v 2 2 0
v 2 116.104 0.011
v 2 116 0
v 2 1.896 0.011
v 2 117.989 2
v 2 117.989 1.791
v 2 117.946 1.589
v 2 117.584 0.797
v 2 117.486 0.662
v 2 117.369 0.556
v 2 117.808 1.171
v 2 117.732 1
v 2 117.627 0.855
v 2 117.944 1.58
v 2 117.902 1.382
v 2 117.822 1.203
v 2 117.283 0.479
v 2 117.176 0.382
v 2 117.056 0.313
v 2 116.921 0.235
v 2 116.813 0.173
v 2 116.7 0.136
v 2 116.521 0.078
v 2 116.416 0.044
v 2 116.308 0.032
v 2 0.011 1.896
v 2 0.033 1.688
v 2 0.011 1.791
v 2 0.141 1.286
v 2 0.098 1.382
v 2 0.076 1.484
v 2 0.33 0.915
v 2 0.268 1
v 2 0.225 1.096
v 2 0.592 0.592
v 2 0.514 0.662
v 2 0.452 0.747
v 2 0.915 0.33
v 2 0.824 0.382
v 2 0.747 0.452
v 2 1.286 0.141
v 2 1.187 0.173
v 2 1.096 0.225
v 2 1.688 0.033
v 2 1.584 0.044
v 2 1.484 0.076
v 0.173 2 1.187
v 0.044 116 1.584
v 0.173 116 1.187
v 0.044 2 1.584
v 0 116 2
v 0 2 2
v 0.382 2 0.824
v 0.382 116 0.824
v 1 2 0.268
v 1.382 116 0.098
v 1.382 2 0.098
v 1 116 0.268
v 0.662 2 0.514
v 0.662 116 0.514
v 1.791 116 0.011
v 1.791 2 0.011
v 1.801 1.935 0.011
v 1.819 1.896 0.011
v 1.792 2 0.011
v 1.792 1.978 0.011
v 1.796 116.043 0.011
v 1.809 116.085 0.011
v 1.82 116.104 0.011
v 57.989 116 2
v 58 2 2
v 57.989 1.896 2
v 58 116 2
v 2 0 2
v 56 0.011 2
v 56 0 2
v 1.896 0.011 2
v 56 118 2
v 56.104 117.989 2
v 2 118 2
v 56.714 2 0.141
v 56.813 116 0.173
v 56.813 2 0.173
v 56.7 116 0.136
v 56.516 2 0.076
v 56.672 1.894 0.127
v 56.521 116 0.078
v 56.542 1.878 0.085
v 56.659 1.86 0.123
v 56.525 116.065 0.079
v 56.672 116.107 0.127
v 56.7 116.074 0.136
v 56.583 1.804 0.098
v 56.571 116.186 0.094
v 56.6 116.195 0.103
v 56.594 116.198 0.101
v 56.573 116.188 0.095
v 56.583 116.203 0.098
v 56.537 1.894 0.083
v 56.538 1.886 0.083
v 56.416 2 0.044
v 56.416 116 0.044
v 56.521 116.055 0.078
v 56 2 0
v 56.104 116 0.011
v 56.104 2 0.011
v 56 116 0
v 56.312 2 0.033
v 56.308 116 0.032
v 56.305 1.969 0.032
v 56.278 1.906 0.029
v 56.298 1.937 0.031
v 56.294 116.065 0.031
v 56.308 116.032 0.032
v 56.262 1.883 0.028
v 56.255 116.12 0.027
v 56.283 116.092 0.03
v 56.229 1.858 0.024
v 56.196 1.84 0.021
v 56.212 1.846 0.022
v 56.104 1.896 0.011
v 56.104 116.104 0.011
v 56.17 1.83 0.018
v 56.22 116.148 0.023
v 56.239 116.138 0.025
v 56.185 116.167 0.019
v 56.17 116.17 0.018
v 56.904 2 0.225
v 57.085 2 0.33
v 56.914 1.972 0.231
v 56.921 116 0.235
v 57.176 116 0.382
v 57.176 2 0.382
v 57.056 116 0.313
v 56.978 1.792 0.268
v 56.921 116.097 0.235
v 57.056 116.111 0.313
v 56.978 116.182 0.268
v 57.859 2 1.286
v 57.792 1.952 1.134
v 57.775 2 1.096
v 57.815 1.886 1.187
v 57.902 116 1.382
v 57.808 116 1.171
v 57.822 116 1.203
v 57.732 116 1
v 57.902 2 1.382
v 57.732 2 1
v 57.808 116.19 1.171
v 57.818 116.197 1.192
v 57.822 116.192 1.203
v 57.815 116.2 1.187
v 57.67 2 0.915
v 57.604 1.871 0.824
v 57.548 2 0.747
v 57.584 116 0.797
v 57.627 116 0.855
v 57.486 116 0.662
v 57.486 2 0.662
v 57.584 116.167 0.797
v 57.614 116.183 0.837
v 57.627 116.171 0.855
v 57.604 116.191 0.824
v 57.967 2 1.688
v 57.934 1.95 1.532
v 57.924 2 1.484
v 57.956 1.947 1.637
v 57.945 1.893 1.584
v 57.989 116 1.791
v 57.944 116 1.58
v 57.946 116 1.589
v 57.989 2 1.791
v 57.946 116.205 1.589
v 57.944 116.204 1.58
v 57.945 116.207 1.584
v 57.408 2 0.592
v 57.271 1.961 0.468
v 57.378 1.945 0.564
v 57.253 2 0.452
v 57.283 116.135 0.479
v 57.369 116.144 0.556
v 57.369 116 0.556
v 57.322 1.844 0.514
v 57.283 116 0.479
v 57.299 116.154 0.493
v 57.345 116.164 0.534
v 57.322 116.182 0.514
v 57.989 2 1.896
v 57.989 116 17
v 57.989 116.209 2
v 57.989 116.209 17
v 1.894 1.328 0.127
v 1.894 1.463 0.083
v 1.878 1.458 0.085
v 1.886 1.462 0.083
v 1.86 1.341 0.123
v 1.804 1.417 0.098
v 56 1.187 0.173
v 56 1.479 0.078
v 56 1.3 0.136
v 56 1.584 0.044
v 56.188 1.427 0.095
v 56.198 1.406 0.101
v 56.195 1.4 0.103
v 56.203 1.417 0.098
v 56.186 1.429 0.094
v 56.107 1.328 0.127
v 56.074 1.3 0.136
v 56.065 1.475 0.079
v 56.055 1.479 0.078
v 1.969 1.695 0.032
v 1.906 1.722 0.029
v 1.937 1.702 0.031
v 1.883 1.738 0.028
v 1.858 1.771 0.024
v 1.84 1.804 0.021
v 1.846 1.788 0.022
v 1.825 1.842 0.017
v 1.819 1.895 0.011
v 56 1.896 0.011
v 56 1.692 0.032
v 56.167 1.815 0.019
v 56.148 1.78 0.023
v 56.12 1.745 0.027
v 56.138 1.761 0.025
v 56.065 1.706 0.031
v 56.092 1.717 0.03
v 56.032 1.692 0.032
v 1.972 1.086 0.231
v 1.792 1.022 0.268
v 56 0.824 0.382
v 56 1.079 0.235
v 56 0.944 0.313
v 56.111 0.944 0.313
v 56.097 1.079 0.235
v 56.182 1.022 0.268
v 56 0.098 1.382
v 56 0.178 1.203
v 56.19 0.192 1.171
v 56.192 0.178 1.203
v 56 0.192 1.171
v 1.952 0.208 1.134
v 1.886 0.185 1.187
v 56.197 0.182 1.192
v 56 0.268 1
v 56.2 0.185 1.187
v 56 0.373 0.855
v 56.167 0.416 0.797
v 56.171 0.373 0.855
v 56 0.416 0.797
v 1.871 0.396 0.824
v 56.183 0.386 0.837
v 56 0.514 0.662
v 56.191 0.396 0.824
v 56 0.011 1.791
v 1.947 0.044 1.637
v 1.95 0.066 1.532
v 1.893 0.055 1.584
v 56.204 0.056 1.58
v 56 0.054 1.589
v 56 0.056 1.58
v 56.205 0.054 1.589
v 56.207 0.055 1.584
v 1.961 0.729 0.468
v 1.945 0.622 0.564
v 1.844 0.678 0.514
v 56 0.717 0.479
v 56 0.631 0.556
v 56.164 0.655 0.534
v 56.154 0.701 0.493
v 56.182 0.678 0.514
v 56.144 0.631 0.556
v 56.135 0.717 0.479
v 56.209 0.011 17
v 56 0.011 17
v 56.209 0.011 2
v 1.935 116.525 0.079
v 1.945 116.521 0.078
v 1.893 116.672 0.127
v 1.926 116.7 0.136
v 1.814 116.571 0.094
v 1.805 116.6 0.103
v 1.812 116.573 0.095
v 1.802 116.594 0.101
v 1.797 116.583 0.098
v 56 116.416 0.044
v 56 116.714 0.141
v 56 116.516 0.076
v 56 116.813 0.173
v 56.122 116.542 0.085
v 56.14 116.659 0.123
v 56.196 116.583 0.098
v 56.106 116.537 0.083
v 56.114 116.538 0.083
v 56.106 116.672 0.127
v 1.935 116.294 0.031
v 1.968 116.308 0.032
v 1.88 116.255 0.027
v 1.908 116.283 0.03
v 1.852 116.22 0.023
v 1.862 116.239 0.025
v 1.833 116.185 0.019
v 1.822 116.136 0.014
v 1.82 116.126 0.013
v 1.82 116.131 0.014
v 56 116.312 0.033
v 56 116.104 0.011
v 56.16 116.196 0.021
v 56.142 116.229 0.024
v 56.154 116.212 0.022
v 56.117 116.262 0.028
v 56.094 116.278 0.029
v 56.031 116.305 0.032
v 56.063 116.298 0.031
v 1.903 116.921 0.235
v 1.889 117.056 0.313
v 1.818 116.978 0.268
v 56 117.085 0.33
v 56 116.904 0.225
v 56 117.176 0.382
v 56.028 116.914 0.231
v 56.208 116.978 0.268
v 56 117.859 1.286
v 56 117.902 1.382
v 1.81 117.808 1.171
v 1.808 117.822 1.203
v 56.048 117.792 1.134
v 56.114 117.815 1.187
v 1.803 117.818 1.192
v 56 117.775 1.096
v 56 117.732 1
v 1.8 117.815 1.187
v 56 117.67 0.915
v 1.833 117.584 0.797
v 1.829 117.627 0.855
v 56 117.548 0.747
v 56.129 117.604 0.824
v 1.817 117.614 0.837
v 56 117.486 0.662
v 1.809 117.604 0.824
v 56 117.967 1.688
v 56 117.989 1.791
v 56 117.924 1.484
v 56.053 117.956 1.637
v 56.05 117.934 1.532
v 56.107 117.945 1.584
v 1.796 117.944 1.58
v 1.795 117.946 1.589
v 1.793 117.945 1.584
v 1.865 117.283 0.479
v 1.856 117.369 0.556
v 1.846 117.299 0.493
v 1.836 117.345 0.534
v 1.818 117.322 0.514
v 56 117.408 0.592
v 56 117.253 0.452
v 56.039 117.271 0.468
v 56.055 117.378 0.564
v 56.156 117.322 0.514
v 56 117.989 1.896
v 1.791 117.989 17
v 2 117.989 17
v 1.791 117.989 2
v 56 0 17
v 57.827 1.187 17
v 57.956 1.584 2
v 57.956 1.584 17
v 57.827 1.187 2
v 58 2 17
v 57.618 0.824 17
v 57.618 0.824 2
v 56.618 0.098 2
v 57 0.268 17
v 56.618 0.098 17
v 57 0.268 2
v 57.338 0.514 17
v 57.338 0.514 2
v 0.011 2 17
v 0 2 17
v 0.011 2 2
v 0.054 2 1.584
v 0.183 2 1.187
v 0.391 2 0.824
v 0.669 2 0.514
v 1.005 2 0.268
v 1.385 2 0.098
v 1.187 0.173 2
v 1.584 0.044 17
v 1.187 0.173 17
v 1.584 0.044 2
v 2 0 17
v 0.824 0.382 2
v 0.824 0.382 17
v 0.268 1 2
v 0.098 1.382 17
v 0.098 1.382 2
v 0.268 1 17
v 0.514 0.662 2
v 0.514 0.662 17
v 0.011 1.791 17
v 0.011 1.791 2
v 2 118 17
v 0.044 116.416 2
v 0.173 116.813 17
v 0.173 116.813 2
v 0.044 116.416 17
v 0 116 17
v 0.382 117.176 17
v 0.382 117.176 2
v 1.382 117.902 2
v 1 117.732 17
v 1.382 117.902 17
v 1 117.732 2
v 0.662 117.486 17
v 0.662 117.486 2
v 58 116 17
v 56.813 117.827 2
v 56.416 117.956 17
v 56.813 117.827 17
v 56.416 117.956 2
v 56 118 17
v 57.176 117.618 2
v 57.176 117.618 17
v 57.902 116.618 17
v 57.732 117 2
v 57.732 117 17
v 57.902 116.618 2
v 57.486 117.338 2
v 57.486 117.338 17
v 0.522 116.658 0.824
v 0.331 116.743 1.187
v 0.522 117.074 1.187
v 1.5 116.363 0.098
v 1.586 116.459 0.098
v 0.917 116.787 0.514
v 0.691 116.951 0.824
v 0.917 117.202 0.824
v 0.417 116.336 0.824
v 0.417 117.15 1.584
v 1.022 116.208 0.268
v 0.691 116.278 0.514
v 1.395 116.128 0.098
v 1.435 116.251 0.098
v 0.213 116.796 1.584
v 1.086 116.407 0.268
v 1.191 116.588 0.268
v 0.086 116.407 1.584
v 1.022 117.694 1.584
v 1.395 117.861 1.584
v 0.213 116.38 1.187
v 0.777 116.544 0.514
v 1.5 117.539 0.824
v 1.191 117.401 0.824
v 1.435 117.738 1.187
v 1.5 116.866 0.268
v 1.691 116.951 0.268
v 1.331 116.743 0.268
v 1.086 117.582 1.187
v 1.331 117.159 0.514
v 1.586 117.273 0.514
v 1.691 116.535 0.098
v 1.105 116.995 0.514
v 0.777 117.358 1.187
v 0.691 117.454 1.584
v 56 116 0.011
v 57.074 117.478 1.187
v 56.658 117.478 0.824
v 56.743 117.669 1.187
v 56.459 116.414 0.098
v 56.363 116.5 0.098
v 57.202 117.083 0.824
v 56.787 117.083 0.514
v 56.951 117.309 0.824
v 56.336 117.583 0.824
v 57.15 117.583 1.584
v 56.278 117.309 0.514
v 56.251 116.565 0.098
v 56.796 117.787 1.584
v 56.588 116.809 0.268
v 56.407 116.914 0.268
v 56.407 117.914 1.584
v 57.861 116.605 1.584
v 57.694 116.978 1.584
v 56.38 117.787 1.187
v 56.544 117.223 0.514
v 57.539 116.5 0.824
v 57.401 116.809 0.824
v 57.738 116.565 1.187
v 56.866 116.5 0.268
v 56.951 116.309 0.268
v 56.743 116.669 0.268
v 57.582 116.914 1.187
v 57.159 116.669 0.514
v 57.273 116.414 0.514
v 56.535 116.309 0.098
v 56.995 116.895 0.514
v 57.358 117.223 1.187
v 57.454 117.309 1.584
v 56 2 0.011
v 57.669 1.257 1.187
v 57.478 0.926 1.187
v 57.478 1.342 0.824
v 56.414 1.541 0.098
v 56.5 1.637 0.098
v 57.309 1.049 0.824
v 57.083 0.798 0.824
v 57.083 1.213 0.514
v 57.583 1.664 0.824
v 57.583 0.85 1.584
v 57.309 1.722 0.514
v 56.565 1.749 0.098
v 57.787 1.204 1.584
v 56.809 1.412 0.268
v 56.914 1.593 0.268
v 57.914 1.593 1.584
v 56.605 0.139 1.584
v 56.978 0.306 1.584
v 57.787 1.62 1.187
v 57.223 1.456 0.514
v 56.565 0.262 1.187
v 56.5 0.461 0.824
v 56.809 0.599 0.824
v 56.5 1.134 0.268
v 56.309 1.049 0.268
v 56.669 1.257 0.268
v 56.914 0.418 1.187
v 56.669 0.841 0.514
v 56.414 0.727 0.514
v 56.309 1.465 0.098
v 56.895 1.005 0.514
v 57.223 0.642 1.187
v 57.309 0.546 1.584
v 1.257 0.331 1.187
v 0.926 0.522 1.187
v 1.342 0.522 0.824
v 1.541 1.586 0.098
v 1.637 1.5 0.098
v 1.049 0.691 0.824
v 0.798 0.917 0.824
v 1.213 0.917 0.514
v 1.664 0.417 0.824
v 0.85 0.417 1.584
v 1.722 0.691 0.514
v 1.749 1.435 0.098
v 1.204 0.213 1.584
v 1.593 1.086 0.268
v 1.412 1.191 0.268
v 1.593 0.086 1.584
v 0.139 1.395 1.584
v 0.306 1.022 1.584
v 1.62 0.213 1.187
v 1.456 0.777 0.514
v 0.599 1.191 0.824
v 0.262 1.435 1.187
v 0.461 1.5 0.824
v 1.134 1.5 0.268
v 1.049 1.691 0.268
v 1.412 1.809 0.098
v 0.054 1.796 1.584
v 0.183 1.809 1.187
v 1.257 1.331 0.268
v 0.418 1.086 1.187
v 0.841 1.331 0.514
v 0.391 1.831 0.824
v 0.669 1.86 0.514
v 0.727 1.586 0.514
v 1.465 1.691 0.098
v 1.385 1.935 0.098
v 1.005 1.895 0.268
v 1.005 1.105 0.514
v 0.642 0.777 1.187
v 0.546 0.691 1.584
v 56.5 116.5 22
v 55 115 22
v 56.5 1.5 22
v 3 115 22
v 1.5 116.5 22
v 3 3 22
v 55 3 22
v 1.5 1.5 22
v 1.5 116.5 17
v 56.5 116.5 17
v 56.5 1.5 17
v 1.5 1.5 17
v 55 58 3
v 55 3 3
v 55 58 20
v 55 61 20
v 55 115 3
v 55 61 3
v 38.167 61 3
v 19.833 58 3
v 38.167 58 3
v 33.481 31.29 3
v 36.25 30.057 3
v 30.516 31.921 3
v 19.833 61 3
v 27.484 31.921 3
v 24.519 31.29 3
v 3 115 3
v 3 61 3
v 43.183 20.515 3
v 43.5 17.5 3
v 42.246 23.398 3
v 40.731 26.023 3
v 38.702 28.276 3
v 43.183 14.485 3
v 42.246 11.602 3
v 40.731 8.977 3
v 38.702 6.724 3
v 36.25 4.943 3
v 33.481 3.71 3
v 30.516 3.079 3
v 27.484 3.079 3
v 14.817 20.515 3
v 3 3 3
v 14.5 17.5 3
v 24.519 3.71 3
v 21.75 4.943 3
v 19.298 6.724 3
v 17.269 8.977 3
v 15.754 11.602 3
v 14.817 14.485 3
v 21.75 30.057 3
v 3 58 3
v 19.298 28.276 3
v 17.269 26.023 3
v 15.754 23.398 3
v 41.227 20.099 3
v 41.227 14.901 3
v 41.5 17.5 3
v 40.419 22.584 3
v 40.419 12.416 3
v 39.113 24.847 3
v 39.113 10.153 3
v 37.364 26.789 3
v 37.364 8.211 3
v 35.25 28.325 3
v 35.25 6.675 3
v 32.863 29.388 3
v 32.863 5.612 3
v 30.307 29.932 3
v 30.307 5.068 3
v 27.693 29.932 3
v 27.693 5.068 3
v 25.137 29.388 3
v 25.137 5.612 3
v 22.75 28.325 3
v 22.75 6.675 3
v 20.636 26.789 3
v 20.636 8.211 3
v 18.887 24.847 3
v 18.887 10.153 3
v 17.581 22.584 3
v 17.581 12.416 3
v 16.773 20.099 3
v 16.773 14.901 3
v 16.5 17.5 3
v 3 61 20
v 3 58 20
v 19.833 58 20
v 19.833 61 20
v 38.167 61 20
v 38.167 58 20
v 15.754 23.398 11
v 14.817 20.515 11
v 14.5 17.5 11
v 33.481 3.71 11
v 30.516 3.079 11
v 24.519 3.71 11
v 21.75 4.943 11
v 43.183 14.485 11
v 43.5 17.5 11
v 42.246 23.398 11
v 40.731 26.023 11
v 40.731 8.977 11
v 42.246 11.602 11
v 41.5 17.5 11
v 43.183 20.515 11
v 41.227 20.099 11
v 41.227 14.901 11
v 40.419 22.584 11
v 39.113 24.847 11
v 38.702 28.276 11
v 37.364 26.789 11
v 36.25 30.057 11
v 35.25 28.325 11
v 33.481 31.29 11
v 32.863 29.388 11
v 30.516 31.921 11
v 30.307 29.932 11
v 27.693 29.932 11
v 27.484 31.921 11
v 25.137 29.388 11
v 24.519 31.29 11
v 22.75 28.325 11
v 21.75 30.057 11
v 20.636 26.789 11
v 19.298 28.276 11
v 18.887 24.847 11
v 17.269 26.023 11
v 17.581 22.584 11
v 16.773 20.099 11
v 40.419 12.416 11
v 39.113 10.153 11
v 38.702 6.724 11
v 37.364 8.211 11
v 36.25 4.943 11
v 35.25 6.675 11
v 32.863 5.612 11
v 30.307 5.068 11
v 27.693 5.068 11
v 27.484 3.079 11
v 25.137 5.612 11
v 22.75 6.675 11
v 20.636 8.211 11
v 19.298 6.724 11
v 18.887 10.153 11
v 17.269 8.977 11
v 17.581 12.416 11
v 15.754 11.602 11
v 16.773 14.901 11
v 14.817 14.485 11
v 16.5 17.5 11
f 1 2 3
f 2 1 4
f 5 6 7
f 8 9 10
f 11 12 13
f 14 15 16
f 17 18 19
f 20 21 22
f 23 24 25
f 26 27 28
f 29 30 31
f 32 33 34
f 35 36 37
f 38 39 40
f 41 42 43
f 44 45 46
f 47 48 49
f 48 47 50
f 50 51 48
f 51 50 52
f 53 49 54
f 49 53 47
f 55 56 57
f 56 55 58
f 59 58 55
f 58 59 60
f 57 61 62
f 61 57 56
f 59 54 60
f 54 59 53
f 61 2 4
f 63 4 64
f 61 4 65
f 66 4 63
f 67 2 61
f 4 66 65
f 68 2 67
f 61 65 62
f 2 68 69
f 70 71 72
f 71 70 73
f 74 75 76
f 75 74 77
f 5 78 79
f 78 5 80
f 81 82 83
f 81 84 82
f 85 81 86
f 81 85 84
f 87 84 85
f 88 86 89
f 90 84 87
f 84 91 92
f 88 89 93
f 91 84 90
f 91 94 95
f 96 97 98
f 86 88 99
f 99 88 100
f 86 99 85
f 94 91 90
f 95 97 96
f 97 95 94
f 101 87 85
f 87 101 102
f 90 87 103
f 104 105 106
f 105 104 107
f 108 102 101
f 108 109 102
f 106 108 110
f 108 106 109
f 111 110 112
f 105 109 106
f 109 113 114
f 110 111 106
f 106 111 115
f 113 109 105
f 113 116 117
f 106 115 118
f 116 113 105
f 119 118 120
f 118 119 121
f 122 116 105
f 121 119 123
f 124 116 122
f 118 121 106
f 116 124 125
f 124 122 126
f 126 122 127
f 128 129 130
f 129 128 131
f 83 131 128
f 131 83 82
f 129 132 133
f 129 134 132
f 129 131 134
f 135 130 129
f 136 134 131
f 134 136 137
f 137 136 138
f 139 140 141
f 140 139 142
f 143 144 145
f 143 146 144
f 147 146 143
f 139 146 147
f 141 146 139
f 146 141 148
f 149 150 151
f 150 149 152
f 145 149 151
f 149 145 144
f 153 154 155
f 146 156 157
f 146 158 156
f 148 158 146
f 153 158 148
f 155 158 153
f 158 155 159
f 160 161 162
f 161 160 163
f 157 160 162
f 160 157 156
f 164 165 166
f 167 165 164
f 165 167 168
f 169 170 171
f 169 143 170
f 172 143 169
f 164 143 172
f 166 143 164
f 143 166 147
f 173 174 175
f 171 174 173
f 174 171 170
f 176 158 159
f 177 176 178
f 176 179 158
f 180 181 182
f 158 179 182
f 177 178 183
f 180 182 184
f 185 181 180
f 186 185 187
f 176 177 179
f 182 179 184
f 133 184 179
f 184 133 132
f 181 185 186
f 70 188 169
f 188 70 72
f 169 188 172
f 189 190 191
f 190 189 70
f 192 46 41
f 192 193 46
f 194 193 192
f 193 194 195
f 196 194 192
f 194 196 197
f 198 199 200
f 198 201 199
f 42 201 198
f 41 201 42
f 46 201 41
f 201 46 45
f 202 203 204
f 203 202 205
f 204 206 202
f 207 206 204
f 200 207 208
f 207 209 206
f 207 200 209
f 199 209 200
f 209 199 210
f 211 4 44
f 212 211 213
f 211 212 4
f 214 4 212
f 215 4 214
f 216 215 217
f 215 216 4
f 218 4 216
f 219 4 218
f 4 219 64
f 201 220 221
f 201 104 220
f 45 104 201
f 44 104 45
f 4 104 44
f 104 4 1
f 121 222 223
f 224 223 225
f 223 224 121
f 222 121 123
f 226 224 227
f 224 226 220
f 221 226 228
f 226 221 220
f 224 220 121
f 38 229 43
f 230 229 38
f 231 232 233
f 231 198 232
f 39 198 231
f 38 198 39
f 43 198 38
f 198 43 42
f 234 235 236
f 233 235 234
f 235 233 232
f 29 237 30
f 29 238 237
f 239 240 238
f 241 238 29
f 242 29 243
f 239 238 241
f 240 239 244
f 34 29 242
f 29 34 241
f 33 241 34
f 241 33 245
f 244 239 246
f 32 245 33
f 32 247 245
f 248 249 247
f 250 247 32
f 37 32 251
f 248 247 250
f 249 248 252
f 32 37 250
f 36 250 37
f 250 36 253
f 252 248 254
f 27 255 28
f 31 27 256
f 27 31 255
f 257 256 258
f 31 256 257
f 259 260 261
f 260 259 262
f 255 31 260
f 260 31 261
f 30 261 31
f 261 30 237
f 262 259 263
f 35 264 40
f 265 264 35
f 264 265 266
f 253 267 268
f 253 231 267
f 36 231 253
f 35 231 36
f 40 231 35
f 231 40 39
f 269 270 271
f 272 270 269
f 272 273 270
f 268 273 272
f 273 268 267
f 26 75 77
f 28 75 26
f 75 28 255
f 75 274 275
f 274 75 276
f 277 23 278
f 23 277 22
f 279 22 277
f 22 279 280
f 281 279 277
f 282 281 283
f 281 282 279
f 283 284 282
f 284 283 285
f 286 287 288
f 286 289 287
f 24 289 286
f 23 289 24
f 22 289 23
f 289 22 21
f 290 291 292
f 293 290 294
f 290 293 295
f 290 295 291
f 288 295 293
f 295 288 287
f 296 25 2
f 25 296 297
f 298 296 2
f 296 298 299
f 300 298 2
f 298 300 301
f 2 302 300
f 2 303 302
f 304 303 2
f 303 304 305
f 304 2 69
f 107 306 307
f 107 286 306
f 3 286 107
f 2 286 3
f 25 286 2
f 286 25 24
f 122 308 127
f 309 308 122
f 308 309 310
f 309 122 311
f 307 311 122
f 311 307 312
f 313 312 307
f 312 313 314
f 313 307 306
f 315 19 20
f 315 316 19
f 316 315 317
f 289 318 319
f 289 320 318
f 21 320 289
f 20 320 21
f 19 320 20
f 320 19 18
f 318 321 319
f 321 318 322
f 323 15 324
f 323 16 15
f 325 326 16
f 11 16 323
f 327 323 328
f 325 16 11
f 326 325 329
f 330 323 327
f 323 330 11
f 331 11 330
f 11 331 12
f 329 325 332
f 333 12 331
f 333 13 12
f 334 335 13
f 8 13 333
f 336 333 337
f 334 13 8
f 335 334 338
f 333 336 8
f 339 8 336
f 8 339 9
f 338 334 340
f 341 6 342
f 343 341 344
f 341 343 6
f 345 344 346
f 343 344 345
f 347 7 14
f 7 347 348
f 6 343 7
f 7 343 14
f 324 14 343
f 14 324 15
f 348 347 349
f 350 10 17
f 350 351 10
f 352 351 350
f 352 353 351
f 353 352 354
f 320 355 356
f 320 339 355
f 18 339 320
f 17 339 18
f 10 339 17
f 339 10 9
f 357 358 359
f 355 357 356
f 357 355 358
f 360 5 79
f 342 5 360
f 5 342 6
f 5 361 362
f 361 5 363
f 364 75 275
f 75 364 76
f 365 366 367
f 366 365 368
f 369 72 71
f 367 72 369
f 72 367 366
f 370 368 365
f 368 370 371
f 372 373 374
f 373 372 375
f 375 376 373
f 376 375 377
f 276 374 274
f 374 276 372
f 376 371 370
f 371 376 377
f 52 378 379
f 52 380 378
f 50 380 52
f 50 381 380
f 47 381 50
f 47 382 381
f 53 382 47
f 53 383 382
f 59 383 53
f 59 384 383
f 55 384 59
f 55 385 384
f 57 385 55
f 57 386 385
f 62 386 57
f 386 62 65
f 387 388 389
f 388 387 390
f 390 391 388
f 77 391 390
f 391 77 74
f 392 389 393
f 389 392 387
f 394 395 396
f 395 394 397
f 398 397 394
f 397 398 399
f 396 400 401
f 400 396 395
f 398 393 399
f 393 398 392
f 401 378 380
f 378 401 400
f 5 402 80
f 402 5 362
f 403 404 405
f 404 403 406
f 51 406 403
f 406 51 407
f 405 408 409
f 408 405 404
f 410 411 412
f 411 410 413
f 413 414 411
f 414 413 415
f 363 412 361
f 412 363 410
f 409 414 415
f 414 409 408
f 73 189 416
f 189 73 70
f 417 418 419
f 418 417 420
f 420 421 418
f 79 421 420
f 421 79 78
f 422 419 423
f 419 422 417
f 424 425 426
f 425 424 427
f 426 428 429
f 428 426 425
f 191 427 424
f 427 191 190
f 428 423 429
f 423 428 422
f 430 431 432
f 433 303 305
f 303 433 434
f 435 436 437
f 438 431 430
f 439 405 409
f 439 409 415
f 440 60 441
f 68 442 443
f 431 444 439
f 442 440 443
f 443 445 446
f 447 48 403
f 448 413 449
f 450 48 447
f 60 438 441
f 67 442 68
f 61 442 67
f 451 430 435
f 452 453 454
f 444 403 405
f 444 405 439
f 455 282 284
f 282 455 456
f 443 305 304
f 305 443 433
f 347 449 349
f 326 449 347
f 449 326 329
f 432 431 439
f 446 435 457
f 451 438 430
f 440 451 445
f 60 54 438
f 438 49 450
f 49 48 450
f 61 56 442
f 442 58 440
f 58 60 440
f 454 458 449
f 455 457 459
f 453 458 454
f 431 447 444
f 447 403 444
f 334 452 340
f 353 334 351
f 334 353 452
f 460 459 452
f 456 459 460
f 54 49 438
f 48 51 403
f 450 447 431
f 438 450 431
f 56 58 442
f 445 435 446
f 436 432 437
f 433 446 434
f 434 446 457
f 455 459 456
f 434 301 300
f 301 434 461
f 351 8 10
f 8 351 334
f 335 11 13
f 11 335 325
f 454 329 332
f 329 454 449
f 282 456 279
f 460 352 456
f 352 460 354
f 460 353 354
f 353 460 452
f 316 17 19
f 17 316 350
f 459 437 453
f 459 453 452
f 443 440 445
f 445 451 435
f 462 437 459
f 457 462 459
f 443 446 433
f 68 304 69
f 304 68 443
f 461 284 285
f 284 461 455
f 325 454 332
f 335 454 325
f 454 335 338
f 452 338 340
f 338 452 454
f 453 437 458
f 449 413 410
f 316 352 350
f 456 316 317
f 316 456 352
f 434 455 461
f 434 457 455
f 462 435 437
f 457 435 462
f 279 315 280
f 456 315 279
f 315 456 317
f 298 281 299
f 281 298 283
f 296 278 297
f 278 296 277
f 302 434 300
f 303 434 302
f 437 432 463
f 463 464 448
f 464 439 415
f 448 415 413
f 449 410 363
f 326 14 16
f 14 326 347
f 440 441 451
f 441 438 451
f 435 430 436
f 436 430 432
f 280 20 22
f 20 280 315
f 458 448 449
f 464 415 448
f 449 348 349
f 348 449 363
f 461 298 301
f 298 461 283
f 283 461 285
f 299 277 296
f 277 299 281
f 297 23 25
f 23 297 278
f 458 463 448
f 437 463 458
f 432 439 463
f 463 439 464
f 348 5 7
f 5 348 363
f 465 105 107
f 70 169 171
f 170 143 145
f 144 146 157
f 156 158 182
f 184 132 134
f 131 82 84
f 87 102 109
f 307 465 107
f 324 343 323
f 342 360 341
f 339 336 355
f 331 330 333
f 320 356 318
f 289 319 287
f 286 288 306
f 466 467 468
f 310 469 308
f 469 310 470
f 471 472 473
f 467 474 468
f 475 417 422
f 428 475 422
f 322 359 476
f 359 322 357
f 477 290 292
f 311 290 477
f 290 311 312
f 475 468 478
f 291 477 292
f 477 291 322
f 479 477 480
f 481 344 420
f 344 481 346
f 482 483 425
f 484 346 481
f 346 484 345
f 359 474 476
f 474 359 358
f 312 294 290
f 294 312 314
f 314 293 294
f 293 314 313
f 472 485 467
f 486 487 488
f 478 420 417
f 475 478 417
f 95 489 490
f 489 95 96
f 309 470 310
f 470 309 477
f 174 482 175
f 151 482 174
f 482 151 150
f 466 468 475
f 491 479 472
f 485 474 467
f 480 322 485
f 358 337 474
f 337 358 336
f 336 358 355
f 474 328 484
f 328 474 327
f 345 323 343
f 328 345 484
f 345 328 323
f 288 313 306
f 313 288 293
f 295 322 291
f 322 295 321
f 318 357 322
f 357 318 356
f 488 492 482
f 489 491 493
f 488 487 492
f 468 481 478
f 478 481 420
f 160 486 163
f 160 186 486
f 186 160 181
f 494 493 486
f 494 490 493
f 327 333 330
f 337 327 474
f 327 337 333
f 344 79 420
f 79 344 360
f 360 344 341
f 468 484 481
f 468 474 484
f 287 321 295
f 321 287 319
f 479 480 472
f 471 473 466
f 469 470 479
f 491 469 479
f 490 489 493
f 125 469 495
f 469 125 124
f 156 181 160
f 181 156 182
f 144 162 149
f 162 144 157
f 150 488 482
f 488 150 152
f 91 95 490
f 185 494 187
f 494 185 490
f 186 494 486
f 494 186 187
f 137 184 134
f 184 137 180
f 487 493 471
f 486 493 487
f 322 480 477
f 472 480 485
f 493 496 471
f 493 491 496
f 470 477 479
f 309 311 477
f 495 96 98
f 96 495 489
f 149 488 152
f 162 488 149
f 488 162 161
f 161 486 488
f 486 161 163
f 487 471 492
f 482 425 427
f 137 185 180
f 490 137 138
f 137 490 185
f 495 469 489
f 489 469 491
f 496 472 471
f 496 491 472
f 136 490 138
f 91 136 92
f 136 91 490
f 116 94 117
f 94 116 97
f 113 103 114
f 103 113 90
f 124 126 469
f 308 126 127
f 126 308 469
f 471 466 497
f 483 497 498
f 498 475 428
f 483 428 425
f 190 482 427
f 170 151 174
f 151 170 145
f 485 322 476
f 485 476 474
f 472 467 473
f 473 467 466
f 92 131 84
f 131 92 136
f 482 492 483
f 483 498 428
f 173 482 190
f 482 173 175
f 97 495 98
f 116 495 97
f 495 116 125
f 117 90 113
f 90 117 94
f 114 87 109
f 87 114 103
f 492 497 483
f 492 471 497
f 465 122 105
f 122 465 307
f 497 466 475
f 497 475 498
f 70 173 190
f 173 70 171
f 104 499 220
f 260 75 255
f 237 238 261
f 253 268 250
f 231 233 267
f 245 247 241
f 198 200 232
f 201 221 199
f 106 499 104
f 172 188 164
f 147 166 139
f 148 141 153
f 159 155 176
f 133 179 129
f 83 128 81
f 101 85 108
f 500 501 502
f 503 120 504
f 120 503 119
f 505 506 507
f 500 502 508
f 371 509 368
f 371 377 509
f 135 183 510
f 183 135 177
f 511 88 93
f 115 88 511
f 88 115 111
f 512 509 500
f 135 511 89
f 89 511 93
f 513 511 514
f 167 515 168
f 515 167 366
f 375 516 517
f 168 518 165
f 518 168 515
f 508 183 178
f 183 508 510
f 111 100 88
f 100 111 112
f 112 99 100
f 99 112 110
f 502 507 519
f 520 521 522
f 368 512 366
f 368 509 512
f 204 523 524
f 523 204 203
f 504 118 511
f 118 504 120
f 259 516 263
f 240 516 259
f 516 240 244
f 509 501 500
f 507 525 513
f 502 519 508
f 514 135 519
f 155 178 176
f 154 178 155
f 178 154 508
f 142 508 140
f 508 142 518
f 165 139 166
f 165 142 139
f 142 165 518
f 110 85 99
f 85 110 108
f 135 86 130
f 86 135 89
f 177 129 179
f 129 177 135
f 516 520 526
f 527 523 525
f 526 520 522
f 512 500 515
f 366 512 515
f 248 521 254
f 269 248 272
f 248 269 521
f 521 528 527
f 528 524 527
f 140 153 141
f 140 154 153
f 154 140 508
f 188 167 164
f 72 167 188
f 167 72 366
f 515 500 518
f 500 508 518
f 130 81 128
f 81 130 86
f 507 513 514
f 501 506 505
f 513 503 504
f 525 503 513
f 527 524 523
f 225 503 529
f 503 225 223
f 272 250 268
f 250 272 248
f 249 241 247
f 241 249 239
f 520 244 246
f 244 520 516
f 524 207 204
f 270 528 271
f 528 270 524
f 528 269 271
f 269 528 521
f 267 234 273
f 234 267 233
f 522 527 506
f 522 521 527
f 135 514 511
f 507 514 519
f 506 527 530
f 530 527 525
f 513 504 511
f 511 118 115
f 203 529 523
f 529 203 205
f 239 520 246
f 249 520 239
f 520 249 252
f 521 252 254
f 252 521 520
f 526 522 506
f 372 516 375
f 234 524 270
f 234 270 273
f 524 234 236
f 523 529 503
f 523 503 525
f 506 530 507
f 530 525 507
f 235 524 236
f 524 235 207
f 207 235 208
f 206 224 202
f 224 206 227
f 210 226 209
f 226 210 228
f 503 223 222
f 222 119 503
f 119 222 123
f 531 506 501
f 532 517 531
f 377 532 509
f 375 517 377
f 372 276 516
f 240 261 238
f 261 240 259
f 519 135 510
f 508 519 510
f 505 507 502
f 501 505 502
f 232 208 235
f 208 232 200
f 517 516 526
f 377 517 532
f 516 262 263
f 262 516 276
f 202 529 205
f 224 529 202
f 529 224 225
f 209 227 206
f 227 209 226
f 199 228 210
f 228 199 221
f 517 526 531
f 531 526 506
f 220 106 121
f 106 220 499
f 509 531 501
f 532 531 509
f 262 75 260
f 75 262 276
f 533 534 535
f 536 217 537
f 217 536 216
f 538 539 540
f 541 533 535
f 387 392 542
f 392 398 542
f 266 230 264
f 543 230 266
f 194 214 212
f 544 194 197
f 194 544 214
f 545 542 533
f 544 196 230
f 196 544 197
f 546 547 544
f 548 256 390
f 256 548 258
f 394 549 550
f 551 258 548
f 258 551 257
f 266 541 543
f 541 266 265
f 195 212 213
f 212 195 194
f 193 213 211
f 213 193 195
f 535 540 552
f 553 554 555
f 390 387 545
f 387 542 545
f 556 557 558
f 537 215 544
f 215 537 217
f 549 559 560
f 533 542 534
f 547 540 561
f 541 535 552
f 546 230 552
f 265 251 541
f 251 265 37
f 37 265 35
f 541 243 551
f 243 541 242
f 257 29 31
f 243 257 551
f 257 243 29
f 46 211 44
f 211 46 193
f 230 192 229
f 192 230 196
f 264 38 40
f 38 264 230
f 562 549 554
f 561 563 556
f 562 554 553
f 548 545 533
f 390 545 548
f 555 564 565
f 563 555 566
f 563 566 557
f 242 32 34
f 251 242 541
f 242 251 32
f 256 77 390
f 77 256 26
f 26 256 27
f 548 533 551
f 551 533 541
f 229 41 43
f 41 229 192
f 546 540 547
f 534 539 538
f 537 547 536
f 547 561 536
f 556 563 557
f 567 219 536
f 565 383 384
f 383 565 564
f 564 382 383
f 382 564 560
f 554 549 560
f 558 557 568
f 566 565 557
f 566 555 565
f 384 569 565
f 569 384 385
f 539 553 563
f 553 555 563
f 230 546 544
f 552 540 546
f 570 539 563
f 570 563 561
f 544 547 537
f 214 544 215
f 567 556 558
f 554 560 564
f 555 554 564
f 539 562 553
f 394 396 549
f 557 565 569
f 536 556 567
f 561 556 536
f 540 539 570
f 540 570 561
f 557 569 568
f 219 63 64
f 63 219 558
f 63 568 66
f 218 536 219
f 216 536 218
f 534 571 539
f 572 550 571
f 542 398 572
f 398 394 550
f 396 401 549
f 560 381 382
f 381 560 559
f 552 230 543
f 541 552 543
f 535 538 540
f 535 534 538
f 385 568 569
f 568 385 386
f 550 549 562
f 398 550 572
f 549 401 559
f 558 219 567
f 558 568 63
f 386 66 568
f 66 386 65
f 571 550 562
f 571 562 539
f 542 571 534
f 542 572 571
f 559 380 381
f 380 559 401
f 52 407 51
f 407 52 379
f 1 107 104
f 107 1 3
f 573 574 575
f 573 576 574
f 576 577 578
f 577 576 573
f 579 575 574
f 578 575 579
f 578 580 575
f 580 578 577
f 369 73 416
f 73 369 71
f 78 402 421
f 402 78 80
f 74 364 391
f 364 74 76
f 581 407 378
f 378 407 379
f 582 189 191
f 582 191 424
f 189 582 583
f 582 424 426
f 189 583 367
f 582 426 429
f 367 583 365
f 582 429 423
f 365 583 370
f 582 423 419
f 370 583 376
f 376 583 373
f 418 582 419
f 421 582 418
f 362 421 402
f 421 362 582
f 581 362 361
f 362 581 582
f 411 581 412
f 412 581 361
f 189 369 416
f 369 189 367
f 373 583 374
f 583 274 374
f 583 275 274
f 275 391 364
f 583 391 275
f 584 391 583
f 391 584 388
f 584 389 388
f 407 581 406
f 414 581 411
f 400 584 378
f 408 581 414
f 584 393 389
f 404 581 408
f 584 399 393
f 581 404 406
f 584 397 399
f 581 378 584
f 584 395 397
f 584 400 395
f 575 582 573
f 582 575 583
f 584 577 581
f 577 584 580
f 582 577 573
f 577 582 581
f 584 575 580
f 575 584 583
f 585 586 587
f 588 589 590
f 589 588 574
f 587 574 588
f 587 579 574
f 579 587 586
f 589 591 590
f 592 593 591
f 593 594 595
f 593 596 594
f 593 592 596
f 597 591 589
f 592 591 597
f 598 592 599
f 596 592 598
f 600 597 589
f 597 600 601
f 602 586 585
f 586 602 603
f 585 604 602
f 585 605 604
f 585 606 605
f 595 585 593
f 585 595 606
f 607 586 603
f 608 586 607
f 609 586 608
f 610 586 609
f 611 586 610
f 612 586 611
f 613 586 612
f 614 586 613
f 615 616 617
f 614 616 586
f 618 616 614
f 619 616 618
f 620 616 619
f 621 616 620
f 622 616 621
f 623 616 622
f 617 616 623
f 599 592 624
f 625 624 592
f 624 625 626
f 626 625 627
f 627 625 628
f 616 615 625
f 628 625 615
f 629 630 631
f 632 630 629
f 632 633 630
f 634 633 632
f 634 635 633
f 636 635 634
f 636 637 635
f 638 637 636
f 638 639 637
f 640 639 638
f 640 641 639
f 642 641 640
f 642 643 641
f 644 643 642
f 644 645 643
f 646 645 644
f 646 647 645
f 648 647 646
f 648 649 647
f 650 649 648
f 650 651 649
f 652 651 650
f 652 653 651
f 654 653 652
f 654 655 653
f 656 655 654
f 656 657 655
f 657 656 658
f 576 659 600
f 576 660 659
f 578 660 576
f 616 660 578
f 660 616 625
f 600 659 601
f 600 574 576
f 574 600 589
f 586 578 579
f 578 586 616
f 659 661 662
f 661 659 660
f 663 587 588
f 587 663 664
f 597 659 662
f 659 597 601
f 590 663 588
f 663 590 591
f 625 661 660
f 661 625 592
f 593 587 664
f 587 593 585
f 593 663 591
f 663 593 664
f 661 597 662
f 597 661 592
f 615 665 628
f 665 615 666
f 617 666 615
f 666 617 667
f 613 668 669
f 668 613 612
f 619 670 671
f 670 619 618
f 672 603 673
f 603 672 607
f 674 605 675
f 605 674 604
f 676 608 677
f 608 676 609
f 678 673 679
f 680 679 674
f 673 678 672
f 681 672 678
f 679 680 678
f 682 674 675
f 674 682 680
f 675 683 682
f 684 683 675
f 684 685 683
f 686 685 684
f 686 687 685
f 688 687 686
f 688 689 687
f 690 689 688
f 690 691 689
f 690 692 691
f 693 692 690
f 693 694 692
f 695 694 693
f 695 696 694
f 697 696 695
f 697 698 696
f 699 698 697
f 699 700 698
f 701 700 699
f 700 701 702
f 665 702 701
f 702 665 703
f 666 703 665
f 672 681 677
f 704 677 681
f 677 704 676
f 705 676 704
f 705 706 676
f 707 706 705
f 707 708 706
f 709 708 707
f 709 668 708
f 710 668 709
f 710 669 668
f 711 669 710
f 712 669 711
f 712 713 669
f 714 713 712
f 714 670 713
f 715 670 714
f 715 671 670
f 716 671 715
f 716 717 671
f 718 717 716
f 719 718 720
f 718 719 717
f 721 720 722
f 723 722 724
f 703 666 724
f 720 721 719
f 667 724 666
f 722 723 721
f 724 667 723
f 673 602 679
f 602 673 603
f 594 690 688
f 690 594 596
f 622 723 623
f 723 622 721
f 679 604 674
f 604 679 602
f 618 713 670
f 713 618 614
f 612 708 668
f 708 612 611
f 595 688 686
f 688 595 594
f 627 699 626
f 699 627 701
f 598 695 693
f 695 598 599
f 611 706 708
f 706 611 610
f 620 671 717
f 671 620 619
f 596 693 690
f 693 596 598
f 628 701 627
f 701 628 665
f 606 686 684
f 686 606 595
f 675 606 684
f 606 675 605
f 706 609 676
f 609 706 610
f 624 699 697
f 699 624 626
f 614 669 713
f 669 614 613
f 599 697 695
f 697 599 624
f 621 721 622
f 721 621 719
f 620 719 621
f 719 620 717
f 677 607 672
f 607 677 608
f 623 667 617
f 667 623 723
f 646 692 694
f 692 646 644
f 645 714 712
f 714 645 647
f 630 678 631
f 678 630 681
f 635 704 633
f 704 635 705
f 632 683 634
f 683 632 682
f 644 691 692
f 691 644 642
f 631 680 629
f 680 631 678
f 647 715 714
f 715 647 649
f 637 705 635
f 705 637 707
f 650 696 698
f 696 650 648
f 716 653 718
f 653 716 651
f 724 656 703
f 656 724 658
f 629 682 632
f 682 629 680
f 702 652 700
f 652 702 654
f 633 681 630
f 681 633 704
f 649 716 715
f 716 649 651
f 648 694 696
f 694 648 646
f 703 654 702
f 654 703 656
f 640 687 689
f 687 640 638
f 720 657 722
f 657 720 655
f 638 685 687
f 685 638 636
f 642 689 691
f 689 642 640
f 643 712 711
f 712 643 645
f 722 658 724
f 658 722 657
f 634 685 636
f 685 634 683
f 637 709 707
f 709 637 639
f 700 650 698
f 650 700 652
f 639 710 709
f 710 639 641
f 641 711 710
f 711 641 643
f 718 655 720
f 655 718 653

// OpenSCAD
// file: common.scad
//---------------------------------------------------------------------------
// Common definitions for the Night Light case
//---------------------------------------------------------------------------
// 27-Mar-2014 ShaneG
//
// This file contains the common definitions (dimensions and utility modules)
// used to generate the two halves of the Night Light case.
//---------------------------------------------------------------------------

// Printer resolution (used for spheres and circles)
RESOLUTION = 0.1;

// Shell information
SHELL_SIZE   = 3;
SHELL_RADIUS = 2;

// Size for the board + battery pack
PCB_WIDTH  = 52;
PCB_HEIGHT = 54;
PCB_DEPTH  = 28;

// Light head dimensions
LIGHT_OUTER_RADIUS = 29 / 2;
LIGHT_INNER_RADIUS = 25 / 2;
LIGHT_DEPTH        = 20;

// Case dimensions
CASE_WIDTH   = PCB_WIDTH + (2 * SHELL_SIZE);
CASE_HEIGHT  = PCB_HEIGHT + (4 * LIGHT_OUTER_RADIUS) + (2 * SHELL_SIZE);
CASE_DEPTH   = PCB_DEPTH + (2 * SHELL_SIZE);
CASE_OVERLAP = 5;

//---------------------------------------------------------------------------
// Modules
//---------------------------------------------------------------------------

// Generate a shape that can be extracted from a cube to generate a rounded
// edge.
module roundedEdge(length, radius) {
  difference() {
    translate(v = [ radius, radius, 0 ]) {
      cube(size = [ radius * 2, radius * 2, length ], center = true);
      }
    cylinder(r = radius, h = length + 1, center = true, $fs = RESOLUTION);
    }
  }

// Generate a shape that can be extracted from a cube to generate a rounded
// corner.
module roundedCorner(radius) {
  difference() {
    cube(size = [ radius * 2, radius * 2, radius * 2 ]);
    sphere(r = radius, $fs = RESOLUTION);
    }
  }

// Generate a box with rounded edges and corners
module roundedBox(width, height, depth, radius) {
  translate(v = [ width, 0, depth ]) {
    rotate(a = [ 0, 180, 0 ]) {
      difference() {
        // Start with the cube
        cube(size = [ width, height, depth ]);
        // Substract the edges
        translate(v = [ width - radius, 0, depth - radius ]) {
          rotate(a = [ 90, 0, 0 ]) {
            roundedEdge(height * 3, radius);
            }
          }
        translate(v = [ radius, 0, depth - radius ]) {
          rotate(a = [ 90, 0, 0 ]) {
            rotate(a = [ 0, 0, 90 ]) {
              roundedEdge(height * 3, radius);
              }
            }
          }
        translate(v = [ 0, radius, depth - radius ]) {
          rotate(a = [ 0, 90, 0 ]) {
            rotate(a = [ 0, 0, 180 ]) {
              roundedEdge(height * 3, radius);
              }
            }
          }
        translate(v = [ 0, height - radius, depth - radius ]) {
          rotate(a = [ 0, -90, 0 ]) {
            roundedEdge(height * 3, radius);
            }
          }
        translate(v = [ radius, radius, 0 ]) {
          rotate(a = [ 0, 0, 180 ]) {
            roundedEdge(height * 3, radius);
            }
          }
        translate(v = [ width - radius, radius, 0 ]) {
          rotate(a = [ 0, 0, -90 ]) {
            roundedEdge(height * 3, radius);
            }
          }
        translate(v = [ width - radius, height - radius, 0 ]) {
          roundedEdge(height * 3, radius);
          }
        translate(v = [ radius, height - radius, 0 ]) {
          rotate(a = [ 0, 0, 90 ]) {
            roundedEdge(height * 3, radius);
            }
          }
        // Substract the corners
        translate(v = [ width - radius, height - radius, depth - radius ]) {
          roundedCorner(radius);
          }
        translate(v = [ radius, height - radius, depth - radius ]) {
          rotate(a = [ 0, 0, 90 ]) {
            roundedCorner(radius);
            }
          }
        translate(v = [ radius, radius, depth - radius ]) {
          rotate(a = [ 0, 0, 180 ]) {
            roundedCorner(radius);
            }
          }
        translate(v = [ width - radius, radius, depth - radius ]) {
          rotate(a = [ 0, 0, 270 ]) {
            roundedCorner(radius);
            }
          }
        }
      }
    }
  }
// main file
//---------------------------------------------------------------------------
// Generate the bottom half of the Night Light case
//---------------------------------------------------------------------------
// 27-Mar-2014 ShaneG
//---------------------------------------------------------------------------
include <common.scad>;

union() {
  difference() {
    // Generate the main case
    roundedBox(CASE_WIDTH, CASE_HEIGHT, (CASE_DEPTH / 2) + CASE_OVERLAP, SHELL_RADIUS);
    // Cut out the main shell
    translate(v = [ SHELL_SIZE, SHELL_SIZE, SHELL_SIZE ]) {
      cube(size = [ CASE_WIDTH - (2 * SHELL_SIZE), CASE_HEIGHT - (2 * SHELL_SIZE), CASE_DEPTH ]);
      }
    // Allow for connections
    translate(v = [ 0, 0, CASE_DEPTH / 2 ]) {
      difference() {
        translate(v = [ -SHELL_SIZE / 2, -SHELL_SIZE / 2, 0 ]) {
          cube(size = [ CASE_WIDTH + SHELL_SIZE, CASE_HEIGHT + SHELL_SIZE, CASE_DEPTH / 2 ]);
          }
        translate(v = [ SHELL_SIZE / 2, SHELL_SIZE / 2, -CASE_DEPTH / 2 ]) {
          cube(size = [ CASE_WIDTH - SHELL_SIZE, CASE_HEIGHT - SHELL_SIZE, 2 * CASE_DEPTH ]);
          }
        }
      }
    }
  // Separator panel to hold the PCB in place
  translate(v = [ SHELL_SIZE / 2, CASE_HEIGHT - (2 * SHELL_SIZE) - PCB_HEIGHT, SHELL_SIZE ]) {
    difference() {
      cube(size = [ CASE_WIDTH - SHELL_SIZE, SHELL_SIZE, CASE_DEPTH / 2 ]);
      translate(v = [ (CASE_WIDTH - SHELL_SIZE) / 3, -SHELL_SIZE / 2, -CASE_DEPTH / 4 ]) {
        cube(size = [ (CASE_WIDTH  - SHELL_SIZE) / 3, SHELL_SIZE * 2, CASE_DEPTH ]);
        }
      }
    }
  // Holder for the light
  translate(v = [ CASE_WIDTH / 2, SHELL_SIZE + LIGHT_OUTER_RADIUS, 0 ]) {
    difference() {
      cylinder(r = LIGHT_OUTER_RADIUS, h = SHELL_SIZE + (PCB_DEPTH - LIGHT_DEPTH), $fs = RESOLUTION);
      translate(v = [ 0, 0, SHELL_SIZE ]) {
        cylinder(r = LIGHT_INNER_RADIUS, h = SHELL_SIZE + (PCB_DEPTH - LIGHT_DEPTH), $fs = RESOLUTION);
        }
      }
    }
  }
